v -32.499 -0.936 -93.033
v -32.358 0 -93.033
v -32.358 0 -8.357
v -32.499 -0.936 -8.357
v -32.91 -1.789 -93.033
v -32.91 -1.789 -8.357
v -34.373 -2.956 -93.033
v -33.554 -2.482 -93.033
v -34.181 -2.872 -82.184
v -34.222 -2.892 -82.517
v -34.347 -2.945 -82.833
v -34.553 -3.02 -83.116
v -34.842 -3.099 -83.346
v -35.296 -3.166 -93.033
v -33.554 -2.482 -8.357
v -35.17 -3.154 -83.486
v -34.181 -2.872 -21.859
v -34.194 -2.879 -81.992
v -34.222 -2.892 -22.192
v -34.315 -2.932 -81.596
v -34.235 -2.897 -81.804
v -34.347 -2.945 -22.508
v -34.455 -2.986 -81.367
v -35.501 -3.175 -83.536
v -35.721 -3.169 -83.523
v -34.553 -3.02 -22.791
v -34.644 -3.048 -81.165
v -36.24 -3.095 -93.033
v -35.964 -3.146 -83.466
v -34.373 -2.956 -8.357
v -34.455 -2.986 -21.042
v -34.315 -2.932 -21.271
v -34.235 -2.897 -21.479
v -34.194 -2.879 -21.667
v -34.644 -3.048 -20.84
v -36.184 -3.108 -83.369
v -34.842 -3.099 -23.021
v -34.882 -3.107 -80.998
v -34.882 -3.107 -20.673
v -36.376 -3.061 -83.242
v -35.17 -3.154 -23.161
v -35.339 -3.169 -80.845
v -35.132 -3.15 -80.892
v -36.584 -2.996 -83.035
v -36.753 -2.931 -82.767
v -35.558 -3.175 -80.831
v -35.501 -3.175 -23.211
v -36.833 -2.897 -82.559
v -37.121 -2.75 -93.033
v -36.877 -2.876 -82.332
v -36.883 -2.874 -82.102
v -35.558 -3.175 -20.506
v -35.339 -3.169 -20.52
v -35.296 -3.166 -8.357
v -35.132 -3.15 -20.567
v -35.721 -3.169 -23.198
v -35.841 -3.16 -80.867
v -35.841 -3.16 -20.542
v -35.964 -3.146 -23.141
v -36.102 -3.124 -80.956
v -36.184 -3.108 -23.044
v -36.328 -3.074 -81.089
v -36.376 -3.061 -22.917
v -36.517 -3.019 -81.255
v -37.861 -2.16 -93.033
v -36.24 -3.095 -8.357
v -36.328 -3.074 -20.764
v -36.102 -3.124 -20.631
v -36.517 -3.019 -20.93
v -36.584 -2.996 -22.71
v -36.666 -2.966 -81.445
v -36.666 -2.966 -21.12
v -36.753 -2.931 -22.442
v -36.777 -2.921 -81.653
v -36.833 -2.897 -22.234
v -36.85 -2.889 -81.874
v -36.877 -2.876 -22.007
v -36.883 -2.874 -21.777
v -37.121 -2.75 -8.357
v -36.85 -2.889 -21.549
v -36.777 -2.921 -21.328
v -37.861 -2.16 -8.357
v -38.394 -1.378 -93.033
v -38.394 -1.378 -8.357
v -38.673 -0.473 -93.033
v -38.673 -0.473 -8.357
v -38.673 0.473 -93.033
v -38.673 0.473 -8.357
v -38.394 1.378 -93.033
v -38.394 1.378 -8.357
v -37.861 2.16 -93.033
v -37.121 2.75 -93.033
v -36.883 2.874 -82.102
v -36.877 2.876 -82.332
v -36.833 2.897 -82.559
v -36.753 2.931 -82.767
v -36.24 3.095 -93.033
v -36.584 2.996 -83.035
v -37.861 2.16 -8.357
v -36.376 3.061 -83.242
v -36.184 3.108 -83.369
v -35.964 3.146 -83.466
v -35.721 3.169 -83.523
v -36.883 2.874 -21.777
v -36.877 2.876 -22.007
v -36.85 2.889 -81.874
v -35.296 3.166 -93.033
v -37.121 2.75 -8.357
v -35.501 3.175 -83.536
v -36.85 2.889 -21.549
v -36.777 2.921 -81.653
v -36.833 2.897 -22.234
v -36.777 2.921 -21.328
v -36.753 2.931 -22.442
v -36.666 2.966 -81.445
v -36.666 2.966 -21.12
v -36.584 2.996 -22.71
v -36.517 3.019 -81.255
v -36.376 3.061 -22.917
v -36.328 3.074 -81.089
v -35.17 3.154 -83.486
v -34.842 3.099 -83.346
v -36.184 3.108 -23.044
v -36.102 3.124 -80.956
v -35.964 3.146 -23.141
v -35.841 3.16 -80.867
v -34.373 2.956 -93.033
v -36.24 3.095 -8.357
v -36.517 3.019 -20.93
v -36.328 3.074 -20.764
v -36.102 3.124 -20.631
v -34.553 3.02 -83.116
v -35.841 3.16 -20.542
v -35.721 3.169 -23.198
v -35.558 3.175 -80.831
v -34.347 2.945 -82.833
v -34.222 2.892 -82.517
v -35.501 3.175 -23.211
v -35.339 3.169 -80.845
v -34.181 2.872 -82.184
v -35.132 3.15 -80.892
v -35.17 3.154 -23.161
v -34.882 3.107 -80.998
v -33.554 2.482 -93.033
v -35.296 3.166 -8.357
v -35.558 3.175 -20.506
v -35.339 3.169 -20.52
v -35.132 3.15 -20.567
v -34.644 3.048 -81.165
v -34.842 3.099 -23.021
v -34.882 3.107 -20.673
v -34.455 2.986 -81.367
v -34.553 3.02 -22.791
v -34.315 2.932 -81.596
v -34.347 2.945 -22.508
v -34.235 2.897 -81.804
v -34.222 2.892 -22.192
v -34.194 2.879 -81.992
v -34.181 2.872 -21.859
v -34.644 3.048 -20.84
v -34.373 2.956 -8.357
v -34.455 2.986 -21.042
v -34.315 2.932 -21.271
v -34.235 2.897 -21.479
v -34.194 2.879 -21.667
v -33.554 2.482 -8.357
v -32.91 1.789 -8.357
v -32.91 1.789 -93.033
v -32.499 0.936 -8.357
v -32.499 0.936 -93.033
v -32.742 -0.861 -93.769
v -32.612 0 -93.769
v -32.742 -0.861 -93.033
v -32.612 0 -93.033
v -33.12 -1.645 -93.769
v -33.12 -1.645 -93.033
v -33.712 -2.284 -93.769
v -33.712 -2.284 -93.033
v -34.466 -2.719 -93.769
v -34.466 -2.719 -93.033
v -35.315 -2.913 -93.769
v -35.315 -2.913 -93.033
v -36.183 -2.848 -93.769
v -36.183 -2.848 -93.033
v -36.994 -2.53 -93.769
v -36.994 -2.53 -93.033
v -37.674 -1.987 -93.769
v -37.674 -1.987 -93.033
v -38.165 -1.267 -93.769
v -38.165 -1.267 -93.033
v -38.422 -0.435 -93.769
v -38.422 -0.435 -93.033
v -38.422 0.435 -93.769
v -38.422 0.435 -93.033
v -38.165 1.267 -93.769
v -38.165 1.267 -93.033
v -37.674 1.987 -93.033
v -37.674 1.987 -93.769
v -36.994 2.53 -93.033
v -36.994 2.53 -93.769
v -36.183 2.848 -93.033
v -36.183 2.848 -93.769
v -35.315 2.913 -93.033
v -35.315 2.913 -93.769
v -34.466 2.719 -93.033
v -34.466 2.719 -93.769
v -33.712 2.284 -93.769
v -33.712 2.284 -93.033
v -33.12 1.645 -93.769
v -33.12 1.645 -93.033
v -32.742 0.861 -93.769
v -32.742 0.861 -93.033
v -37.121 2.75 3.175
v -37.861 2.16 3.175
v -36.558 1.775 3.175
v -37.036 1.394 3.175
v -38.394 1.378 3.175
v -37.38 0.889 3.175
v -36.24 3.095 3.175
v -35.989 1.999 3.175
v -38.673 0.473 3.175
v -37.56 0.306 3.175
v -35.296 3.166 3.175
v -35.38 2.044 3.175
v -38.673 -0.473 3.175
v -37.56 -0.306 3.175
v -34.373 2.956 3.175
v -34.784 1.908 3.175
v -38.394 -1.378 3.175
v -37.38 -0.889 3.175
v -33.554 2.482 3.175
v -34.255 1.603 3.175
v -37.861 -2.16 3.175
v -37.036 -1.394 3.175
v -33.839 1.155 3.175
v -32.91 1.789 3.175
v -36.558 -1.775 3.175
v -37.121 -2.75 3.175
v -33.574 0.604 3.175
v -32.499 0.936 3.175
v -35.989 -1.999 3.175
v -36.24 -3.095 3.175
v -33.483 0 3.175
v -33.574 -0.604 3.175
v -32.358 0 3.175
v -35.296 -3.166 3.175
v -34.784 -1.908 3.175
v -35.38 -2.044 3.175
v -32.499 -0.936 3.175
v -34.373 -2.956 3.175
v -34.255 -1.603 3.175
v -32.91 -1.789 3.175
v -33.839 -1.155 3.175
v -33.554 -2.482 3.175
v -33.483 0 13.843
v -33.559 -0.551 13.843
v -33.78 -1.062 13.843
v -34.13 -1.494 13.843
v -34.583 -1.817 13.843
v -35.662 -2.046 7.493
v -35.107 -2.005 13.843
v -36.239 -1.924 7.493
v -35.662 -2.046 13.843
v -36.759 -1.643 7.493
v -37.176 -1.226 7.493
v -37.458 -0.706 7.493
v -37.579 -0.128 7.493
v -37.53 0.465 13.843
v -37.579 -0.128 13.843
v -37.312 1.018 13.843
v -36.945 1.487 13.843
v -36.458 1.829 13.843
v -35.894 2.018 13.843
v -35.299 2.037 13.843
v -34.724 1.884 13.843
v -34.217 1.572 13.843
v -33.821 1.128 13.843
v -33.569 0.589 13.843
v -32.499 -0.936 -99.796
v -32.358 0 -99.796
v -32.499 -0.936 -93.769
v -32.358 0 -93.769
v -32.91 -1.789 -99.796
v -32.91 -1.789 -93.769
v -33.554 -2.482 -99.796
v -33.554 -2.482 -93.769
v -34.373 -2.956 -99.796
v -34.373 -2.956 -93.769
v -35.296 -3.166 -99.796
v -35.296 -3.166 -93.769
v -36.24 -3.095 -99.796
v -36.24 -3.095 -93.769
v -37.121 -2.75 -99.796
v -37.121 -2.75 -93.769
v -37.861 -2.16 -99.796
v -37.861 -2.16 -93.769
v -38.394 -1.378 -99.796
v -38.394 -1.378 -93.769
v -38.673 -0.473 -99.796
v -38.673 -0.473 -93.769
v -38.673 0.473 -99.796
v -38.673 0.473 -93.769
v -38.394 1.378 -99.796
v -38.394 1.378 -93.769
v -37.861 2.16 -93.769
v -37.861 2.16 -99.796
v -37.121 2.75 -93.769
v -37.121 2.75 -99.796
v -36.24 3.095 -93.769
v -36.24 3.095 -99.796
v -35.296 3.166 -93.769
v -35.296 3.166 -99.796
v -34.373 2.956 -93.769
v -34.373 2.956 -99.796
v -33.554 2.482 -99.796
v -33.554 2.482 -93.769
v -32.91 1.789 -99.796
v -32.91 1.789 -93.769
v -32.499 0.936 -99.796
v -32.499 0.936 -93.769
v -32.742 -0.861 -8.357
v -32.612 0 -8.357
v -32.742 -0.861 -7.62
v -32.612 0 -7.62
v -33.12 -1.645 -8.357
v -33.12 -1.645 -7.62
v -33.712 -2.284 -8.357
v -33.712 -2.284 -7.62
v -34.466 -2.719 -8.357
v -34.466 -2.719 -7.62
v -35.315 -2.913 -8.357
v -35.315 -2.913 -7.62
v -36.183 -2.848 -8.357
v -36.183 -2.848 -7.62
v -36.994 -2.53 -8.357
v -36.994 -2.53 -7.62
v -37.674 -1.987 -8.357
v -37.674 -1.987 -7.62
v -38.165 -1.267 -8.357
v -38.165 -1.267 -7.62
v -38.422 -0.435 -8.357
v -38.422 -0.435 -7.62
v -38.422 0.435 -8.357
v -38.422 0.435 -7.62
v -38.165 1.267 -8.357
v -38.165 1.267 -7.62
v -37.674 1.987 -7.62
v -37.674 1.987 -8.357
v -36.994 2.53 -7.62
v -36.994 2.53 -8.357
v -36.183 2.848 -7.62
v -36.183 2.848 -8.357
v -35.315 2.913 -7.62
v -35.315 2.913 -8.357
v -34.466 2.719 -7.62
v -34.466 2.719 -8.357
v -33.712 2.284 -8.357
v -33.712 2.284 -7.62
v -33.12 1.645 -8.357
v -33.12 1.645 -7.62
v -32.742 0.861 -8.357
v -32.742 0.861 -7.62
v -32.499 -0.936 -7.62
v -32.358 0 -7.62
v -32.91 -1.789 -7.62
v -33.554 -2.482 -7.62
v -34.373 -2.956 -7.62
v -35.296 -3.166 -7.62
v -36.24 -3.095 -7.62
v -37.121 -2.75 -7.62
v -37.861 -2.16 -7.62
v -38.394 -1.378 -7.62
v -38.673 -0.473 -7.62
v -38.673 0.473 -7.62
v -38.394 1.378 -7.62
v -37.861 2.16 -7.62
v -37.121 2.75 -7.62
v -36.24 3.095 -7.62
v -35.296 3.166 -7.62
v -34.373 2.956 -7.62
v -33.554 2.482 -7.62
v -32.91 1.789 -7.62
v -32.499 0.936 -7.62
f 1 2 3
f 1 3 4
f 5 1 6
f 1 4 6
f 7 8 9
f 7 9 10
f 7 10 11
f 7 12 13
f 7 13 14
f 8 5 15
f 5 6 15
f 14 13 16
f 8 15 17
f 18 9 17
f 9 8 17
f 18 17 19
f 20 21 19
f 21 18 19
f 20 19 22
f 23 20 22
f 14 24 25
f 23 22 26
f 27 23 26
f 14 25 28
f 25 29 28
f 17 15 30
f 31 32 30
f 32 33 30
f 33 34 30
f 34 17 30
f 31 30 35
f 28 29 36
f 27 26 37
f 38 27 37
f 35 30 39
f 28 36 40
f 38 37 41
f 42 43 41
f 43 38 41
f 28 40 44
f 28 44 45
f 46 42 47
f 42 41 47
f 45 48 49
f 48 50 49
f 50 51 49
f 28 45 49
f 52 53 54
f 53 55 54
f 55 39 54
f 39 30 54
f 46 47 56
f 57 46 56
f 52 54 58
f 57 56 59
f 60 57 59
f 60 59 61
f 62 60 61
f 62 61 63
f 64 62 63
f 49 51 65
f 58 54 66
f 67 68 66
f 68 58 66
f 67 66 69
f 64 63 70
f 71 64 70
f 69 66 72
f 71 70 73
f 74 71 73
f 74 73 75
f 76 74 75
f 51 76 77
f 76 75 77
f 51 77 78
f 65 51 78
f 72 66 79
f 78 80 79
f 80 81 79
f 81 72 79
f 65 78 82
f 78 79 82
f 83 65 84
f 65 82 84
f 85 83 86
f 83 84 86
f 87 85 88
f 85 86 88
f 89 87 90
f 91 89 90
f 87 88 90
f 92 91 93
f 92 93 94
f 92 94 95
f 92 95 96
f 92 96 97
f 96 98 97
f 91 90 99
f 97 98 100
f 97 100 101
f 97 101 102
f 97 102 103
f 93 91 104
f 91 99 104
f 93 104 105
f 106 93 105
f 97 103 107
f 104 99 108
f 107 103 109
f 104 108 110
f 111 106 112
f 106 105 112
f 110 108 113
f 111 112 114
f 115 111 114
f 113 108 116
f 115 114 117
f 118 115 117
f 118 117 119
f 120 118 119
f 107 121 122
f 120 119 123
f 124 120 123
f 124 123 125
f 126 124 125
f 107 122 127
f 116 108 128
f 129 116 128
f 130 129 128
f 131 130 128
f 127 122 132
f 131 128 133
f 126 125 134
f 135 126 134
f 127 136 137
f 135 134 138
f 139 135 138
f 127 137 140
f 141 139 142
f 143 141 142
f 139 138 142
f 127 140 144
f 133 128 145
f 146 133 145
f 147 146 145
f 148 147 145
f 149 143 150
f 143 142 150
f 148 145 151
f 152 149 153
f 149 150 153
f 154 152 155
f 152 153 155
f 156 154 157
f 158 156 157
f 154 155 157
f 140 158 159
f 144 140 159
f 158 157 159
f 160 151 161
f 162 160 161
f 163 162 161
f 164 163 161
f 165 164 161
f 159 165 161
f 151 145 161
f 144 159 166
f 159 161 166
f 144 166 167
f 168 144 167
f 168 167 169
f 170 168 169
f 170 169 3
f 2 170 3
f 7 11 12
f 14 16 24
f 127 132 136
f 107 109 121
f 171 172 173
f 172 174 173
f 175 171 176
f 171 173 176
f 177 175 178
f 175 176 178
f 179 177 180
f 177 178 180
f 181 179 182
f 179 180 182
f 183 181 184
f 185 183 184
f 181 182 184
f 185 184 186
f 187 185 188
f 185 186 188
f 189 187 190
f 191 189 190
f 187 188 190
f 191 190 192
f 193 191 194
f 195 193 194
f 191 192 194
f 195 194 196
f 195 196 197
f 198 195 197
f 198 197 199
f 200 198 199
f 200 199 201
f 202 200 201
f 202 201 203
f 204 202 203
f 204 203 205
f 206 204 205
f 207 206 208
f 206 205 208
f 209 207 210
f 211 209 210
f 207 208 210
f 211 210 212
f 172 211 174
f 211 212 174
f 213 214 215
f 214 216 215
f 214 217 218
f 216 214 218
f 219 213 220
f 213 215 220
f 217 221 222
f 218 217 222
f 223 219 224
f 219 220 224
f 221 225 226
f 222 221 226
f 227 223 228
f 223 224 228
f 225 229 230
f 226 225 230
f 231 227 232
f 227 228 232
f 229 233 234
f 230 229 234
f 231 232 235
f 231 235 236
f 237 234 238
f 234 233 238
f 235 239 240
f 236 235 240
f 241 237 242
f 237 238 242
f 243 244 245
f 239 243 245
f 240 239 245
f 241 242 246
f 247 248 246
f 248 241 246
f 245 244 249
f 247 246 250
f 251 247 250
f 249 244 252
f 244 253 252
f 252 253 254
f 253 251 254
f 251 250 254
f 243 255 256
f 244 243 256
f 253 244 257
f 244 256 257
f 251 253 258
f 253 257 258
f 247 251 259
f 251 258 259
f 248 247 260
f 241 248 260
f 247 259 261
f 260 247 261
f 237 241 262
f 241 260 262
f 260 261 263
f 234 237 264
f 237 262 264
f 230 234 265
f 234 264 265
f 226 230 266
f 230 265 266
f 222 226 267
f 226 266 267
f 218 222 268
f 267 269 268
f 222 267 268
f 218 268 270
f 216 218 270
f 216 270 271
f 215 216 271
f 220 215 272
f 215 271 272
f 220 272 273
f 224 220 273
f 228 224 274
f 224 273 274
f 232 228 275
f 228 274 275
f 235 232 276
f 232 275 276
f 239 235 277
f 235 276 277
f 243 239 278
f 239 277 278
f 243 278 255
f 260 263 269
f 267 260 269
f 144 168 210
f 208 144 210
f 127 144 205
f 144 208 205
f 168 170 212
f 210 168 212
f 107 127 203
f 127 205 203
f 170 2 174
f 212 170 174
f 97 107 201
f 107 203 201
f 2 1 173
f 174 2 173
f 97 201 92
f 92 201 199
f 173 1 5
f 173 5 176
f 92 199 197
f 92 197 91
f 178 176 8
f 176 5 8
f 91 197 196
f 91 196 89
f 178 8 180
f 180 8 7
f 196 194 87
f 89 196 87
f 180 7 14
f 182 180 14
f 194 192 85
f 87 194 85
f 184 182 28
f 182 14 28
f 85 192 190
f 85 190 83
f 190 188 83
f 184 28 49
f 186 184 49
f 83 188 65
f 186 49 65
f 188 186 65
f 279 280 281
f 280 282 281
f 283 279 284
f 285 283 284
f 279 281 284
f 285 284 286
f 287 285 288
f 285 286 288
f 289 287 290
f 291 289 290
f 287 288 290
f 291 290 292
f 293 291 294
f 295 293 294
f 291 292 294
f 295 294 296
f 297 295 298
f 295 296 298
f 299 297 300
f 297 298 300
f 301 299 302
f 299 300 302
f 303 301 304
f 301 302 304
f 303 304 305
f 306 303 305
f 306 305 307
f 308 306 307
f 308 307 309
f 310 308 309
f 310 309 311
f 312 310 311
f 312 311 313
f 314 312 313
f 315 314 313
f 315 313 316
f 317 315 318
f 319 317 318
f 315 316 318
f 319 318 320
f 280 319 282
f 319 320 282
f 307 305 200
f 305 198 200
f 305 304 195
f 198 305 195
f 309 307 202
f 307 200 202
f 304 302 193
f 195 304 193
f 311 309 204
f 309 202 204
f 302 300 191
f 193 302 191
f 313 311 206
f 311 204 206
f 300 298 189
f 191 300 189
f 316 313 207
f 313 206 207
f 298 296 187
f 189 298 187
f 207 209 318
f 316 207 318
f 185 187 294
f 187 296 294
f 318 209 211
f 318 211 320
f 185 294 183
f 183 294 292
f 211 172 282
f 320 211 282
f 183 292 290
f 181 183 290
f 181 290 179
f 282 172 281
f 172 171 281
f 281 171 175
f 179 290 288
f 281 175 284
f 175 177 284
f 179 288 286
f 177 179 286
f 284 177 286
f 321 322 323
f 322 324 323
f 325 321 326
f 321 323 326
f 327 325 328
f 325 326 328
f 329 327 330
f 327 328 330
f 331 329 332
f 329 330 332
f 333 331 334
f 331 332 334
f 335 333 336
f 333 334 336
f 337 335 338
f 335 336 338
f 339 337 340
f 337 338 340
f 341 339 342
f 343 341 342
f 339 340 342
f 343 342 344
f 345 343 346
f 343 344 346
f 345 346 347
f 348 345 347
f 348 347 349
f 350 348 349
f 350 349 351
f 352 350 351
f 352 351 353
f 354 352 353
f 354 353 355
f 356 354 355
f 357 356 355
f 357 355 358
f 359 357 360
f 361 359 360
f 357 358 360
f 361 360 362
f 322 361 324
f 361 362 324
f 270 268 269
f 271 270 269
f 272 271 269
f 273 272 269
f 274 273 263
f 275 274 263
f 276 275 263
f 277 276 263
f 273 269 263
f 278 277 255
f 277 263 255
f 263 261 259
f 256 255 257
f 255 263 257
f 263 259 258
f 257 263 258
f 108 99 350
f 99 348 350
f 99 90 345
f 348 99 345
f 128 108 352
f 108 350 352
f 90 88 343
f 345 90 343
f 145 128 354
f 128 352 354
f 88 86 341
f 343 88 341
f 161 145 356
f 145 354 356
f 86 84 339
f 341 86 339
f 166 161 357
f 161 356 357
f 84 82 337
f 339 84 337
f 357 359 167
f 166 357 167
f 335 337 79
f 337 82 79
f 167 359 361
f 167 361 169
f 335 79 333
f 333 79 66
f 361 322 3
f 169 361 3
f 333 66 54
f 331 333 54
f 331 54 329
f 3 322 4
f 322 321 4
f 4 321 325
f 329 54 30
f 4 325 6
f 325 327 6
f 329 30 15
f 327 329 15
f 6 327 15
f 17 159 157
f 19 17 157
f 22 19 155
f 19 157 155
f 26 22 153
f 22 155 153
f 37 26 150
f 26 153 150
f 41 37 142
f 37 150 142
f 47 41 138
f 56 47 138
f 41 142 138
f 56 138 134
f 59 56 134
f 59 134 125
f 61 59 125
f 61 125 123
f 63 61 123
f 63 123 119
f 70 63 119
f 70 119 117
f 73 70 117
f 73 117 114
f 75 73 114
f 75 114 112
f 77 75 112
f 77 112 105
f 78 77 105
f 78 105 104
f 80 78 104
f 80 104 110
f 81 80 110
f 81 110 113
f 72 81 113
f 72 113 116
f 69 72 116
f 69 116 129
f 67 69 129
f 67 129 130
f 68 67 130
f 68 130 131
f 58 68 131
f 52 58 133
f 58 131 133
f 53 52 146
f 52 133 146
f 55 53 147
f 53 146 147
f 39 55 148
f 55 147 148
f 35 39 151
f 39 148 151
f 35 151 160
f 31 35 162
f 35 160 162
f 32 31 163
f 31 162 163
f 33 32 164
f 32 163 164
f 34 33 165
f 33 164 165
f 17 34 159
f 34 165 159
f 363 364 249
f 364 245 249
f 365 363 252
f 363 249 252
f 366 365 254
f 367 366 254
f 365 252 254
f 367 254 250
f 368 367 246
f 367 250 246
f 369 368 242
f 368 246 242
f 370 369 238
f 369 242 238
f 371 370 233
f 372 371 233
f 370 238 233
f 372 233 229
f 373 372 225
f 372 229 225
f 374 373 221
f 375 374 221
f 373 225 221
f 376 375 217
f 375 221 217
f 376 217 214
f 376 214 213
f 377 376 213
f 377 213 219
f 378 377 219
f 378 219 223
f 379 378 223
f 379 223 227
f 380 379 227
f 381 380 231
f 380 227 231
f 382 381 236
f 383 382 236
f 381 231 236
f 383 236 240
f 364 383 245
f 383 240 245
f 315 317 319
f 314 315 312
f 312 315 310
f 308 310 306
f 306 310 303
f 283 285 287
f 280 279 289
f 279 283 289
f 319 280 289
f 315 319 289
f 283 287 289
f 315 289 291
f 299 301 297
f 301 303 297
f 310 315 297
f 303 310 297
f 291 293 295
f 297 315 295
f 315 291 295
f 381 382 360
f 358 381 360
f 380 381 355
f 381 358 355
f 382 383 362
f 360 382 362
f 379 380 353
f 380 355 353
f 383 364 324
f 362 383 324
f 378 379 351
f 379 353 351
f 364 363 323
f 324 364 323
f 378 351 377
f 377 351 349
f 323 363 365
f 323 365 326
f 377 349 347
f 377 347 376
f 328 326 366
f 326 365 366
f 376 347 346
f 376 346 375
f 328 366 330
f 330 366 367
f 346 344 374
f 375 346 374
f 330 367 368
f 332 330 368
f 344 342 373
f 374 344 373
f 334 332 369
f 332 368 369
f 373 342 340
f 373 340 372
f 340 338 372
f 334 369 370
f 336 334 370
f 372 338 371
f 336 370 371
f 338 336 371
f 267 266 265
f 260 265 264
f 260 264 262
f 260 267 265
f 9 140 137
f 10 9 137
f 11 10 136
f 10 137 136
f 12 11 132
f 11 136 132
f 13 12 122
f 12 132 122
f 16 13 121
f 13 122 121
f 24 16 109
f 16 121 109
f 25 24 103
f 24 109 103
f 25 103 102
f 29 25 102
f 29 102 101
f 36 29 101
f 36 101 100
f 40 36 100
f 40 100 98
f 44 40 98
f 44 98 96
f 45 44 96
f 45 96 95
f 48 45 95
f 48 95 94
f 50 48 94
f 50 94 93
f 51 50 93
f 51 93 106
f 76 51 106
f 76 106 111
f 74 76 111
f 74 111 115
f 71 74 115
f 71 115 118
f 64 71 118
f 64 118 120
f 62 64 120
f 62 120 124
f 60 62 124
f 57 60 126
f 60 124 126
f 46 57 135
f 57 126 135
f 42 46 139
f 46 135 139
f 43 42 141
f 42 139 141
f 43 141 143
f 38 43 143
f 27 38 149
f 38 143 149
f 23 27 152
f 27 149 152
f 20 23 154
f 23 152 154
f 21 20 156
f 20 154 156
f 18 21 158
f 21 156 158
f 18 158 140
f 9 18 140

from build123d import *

# Parameters (mm, degrees)
SKETCH1_W                 = 3.175
SKETCH1_H                 = 9.525
SKETCH1_H_2               = 50.8
F_6_32_TAPPED_HOLE1_D     = 2.7051
F_6_32_TAPPED_HOLE1_DEPTH = 9.398
F_6_32_TAPPED_HOLE1_TIP   = 0.81269403
CUT_EXTRUDE1_DEPTH        = 6.35


with BuildPart() as part:
    # Sketch1 → Revolve1 (revolve)
    with BuildSketch(Plane(origin=(0, 0, 0), x_dir=(1, 0, 0), z_dir=(0, 1, 0)), mode=Mode.PRIVATE) as revolve1_sk:
        Polygon((-38.708137827, 86.94610411), (-35.533137827, 86.94610411), (-35.533137827, 99.795553682), (-38.708137827, 99.795553682), (-38.708137827, 93.769403682), (-38.454137827, 93.769403682), (-38.454137827, 93.032803682), (-38.708137827, 93.032803682), align=None)
        with Locations((-37.120637827, 82.18360411)):
            Rectangle(SKETCH1_W, SKETCH1_H)
        with Locations((-37.120637827, 52.02110411)):
            Rectangle(SKETCH1_W, SKETCH1_H_2)
        with Locations((-37.120637827, 21.85860411)):
            Rectangle(SKETCH1_W, SKETCH1_H)
        Polygon((-38.708137827, -3.175), (-37.583137827, -3.175), (-37.583137827, -13.843), (-35.533137827, -13.843), (-35.533137827, 17.09610411), (-38.708137827, 17.09610411), (-38.708137827, 8.3566), (-38.454137827, 8.3566), (-38.454137827, 7.62), (-38.708137827, 7.62), align=None)
    revolve(revolve1_sk.sketch.rotate(Axis((-35.533137827, 0, 13.843), (0, 0, -1)), 180), axis=Axis((-35.533137827, 0, 13.843), (0, 0, -1)))

    # #6-32 Tapped Hole1
    with Locations(Plane(origin=(0, -3.175, 0), x_dir=(-1, 0, 0), z_dir=(0, -1, 0))):
        with Locations((35.533137827, 82.18360411), (35.533137827, 21.85860411)):
            Hole(F_6_32_TAPPED_HOLE1_D / 2, depth=F_6_32_TAPPED_HOLE1_DEPTH)
            with Locations((0, 0, -(F_6_32_TAPPED_HOLE1_DEPTH + F_6_32_TAPPED_HOLE1_TIP / 2))):  # 118° drill point
                Cone(0, F_6_32_TAPPED_HOLE1_D / 2, F_6_32_TAPPED_HOLE1_TIP, mode=Mode.SUBTRACT)

    # Sketch4 → Cut-Extrude1 (cut)
    with BuildSketch(Plane.XY.offset(13.843)):
        Polygon((-19.85306803, -17.854423149), (-35.661514798, -2.045976381), (-37.579114208, -0.128376971), (-53.387560976, 15.680069797), (-85.00445451, -15.936823738), (-51.469961565, -49.471316683), align=None)
    extrude(amount=-CUT_EXTRUDE1_DEPTH, mode=Mode.SUBTRACT)


solid = part.part
